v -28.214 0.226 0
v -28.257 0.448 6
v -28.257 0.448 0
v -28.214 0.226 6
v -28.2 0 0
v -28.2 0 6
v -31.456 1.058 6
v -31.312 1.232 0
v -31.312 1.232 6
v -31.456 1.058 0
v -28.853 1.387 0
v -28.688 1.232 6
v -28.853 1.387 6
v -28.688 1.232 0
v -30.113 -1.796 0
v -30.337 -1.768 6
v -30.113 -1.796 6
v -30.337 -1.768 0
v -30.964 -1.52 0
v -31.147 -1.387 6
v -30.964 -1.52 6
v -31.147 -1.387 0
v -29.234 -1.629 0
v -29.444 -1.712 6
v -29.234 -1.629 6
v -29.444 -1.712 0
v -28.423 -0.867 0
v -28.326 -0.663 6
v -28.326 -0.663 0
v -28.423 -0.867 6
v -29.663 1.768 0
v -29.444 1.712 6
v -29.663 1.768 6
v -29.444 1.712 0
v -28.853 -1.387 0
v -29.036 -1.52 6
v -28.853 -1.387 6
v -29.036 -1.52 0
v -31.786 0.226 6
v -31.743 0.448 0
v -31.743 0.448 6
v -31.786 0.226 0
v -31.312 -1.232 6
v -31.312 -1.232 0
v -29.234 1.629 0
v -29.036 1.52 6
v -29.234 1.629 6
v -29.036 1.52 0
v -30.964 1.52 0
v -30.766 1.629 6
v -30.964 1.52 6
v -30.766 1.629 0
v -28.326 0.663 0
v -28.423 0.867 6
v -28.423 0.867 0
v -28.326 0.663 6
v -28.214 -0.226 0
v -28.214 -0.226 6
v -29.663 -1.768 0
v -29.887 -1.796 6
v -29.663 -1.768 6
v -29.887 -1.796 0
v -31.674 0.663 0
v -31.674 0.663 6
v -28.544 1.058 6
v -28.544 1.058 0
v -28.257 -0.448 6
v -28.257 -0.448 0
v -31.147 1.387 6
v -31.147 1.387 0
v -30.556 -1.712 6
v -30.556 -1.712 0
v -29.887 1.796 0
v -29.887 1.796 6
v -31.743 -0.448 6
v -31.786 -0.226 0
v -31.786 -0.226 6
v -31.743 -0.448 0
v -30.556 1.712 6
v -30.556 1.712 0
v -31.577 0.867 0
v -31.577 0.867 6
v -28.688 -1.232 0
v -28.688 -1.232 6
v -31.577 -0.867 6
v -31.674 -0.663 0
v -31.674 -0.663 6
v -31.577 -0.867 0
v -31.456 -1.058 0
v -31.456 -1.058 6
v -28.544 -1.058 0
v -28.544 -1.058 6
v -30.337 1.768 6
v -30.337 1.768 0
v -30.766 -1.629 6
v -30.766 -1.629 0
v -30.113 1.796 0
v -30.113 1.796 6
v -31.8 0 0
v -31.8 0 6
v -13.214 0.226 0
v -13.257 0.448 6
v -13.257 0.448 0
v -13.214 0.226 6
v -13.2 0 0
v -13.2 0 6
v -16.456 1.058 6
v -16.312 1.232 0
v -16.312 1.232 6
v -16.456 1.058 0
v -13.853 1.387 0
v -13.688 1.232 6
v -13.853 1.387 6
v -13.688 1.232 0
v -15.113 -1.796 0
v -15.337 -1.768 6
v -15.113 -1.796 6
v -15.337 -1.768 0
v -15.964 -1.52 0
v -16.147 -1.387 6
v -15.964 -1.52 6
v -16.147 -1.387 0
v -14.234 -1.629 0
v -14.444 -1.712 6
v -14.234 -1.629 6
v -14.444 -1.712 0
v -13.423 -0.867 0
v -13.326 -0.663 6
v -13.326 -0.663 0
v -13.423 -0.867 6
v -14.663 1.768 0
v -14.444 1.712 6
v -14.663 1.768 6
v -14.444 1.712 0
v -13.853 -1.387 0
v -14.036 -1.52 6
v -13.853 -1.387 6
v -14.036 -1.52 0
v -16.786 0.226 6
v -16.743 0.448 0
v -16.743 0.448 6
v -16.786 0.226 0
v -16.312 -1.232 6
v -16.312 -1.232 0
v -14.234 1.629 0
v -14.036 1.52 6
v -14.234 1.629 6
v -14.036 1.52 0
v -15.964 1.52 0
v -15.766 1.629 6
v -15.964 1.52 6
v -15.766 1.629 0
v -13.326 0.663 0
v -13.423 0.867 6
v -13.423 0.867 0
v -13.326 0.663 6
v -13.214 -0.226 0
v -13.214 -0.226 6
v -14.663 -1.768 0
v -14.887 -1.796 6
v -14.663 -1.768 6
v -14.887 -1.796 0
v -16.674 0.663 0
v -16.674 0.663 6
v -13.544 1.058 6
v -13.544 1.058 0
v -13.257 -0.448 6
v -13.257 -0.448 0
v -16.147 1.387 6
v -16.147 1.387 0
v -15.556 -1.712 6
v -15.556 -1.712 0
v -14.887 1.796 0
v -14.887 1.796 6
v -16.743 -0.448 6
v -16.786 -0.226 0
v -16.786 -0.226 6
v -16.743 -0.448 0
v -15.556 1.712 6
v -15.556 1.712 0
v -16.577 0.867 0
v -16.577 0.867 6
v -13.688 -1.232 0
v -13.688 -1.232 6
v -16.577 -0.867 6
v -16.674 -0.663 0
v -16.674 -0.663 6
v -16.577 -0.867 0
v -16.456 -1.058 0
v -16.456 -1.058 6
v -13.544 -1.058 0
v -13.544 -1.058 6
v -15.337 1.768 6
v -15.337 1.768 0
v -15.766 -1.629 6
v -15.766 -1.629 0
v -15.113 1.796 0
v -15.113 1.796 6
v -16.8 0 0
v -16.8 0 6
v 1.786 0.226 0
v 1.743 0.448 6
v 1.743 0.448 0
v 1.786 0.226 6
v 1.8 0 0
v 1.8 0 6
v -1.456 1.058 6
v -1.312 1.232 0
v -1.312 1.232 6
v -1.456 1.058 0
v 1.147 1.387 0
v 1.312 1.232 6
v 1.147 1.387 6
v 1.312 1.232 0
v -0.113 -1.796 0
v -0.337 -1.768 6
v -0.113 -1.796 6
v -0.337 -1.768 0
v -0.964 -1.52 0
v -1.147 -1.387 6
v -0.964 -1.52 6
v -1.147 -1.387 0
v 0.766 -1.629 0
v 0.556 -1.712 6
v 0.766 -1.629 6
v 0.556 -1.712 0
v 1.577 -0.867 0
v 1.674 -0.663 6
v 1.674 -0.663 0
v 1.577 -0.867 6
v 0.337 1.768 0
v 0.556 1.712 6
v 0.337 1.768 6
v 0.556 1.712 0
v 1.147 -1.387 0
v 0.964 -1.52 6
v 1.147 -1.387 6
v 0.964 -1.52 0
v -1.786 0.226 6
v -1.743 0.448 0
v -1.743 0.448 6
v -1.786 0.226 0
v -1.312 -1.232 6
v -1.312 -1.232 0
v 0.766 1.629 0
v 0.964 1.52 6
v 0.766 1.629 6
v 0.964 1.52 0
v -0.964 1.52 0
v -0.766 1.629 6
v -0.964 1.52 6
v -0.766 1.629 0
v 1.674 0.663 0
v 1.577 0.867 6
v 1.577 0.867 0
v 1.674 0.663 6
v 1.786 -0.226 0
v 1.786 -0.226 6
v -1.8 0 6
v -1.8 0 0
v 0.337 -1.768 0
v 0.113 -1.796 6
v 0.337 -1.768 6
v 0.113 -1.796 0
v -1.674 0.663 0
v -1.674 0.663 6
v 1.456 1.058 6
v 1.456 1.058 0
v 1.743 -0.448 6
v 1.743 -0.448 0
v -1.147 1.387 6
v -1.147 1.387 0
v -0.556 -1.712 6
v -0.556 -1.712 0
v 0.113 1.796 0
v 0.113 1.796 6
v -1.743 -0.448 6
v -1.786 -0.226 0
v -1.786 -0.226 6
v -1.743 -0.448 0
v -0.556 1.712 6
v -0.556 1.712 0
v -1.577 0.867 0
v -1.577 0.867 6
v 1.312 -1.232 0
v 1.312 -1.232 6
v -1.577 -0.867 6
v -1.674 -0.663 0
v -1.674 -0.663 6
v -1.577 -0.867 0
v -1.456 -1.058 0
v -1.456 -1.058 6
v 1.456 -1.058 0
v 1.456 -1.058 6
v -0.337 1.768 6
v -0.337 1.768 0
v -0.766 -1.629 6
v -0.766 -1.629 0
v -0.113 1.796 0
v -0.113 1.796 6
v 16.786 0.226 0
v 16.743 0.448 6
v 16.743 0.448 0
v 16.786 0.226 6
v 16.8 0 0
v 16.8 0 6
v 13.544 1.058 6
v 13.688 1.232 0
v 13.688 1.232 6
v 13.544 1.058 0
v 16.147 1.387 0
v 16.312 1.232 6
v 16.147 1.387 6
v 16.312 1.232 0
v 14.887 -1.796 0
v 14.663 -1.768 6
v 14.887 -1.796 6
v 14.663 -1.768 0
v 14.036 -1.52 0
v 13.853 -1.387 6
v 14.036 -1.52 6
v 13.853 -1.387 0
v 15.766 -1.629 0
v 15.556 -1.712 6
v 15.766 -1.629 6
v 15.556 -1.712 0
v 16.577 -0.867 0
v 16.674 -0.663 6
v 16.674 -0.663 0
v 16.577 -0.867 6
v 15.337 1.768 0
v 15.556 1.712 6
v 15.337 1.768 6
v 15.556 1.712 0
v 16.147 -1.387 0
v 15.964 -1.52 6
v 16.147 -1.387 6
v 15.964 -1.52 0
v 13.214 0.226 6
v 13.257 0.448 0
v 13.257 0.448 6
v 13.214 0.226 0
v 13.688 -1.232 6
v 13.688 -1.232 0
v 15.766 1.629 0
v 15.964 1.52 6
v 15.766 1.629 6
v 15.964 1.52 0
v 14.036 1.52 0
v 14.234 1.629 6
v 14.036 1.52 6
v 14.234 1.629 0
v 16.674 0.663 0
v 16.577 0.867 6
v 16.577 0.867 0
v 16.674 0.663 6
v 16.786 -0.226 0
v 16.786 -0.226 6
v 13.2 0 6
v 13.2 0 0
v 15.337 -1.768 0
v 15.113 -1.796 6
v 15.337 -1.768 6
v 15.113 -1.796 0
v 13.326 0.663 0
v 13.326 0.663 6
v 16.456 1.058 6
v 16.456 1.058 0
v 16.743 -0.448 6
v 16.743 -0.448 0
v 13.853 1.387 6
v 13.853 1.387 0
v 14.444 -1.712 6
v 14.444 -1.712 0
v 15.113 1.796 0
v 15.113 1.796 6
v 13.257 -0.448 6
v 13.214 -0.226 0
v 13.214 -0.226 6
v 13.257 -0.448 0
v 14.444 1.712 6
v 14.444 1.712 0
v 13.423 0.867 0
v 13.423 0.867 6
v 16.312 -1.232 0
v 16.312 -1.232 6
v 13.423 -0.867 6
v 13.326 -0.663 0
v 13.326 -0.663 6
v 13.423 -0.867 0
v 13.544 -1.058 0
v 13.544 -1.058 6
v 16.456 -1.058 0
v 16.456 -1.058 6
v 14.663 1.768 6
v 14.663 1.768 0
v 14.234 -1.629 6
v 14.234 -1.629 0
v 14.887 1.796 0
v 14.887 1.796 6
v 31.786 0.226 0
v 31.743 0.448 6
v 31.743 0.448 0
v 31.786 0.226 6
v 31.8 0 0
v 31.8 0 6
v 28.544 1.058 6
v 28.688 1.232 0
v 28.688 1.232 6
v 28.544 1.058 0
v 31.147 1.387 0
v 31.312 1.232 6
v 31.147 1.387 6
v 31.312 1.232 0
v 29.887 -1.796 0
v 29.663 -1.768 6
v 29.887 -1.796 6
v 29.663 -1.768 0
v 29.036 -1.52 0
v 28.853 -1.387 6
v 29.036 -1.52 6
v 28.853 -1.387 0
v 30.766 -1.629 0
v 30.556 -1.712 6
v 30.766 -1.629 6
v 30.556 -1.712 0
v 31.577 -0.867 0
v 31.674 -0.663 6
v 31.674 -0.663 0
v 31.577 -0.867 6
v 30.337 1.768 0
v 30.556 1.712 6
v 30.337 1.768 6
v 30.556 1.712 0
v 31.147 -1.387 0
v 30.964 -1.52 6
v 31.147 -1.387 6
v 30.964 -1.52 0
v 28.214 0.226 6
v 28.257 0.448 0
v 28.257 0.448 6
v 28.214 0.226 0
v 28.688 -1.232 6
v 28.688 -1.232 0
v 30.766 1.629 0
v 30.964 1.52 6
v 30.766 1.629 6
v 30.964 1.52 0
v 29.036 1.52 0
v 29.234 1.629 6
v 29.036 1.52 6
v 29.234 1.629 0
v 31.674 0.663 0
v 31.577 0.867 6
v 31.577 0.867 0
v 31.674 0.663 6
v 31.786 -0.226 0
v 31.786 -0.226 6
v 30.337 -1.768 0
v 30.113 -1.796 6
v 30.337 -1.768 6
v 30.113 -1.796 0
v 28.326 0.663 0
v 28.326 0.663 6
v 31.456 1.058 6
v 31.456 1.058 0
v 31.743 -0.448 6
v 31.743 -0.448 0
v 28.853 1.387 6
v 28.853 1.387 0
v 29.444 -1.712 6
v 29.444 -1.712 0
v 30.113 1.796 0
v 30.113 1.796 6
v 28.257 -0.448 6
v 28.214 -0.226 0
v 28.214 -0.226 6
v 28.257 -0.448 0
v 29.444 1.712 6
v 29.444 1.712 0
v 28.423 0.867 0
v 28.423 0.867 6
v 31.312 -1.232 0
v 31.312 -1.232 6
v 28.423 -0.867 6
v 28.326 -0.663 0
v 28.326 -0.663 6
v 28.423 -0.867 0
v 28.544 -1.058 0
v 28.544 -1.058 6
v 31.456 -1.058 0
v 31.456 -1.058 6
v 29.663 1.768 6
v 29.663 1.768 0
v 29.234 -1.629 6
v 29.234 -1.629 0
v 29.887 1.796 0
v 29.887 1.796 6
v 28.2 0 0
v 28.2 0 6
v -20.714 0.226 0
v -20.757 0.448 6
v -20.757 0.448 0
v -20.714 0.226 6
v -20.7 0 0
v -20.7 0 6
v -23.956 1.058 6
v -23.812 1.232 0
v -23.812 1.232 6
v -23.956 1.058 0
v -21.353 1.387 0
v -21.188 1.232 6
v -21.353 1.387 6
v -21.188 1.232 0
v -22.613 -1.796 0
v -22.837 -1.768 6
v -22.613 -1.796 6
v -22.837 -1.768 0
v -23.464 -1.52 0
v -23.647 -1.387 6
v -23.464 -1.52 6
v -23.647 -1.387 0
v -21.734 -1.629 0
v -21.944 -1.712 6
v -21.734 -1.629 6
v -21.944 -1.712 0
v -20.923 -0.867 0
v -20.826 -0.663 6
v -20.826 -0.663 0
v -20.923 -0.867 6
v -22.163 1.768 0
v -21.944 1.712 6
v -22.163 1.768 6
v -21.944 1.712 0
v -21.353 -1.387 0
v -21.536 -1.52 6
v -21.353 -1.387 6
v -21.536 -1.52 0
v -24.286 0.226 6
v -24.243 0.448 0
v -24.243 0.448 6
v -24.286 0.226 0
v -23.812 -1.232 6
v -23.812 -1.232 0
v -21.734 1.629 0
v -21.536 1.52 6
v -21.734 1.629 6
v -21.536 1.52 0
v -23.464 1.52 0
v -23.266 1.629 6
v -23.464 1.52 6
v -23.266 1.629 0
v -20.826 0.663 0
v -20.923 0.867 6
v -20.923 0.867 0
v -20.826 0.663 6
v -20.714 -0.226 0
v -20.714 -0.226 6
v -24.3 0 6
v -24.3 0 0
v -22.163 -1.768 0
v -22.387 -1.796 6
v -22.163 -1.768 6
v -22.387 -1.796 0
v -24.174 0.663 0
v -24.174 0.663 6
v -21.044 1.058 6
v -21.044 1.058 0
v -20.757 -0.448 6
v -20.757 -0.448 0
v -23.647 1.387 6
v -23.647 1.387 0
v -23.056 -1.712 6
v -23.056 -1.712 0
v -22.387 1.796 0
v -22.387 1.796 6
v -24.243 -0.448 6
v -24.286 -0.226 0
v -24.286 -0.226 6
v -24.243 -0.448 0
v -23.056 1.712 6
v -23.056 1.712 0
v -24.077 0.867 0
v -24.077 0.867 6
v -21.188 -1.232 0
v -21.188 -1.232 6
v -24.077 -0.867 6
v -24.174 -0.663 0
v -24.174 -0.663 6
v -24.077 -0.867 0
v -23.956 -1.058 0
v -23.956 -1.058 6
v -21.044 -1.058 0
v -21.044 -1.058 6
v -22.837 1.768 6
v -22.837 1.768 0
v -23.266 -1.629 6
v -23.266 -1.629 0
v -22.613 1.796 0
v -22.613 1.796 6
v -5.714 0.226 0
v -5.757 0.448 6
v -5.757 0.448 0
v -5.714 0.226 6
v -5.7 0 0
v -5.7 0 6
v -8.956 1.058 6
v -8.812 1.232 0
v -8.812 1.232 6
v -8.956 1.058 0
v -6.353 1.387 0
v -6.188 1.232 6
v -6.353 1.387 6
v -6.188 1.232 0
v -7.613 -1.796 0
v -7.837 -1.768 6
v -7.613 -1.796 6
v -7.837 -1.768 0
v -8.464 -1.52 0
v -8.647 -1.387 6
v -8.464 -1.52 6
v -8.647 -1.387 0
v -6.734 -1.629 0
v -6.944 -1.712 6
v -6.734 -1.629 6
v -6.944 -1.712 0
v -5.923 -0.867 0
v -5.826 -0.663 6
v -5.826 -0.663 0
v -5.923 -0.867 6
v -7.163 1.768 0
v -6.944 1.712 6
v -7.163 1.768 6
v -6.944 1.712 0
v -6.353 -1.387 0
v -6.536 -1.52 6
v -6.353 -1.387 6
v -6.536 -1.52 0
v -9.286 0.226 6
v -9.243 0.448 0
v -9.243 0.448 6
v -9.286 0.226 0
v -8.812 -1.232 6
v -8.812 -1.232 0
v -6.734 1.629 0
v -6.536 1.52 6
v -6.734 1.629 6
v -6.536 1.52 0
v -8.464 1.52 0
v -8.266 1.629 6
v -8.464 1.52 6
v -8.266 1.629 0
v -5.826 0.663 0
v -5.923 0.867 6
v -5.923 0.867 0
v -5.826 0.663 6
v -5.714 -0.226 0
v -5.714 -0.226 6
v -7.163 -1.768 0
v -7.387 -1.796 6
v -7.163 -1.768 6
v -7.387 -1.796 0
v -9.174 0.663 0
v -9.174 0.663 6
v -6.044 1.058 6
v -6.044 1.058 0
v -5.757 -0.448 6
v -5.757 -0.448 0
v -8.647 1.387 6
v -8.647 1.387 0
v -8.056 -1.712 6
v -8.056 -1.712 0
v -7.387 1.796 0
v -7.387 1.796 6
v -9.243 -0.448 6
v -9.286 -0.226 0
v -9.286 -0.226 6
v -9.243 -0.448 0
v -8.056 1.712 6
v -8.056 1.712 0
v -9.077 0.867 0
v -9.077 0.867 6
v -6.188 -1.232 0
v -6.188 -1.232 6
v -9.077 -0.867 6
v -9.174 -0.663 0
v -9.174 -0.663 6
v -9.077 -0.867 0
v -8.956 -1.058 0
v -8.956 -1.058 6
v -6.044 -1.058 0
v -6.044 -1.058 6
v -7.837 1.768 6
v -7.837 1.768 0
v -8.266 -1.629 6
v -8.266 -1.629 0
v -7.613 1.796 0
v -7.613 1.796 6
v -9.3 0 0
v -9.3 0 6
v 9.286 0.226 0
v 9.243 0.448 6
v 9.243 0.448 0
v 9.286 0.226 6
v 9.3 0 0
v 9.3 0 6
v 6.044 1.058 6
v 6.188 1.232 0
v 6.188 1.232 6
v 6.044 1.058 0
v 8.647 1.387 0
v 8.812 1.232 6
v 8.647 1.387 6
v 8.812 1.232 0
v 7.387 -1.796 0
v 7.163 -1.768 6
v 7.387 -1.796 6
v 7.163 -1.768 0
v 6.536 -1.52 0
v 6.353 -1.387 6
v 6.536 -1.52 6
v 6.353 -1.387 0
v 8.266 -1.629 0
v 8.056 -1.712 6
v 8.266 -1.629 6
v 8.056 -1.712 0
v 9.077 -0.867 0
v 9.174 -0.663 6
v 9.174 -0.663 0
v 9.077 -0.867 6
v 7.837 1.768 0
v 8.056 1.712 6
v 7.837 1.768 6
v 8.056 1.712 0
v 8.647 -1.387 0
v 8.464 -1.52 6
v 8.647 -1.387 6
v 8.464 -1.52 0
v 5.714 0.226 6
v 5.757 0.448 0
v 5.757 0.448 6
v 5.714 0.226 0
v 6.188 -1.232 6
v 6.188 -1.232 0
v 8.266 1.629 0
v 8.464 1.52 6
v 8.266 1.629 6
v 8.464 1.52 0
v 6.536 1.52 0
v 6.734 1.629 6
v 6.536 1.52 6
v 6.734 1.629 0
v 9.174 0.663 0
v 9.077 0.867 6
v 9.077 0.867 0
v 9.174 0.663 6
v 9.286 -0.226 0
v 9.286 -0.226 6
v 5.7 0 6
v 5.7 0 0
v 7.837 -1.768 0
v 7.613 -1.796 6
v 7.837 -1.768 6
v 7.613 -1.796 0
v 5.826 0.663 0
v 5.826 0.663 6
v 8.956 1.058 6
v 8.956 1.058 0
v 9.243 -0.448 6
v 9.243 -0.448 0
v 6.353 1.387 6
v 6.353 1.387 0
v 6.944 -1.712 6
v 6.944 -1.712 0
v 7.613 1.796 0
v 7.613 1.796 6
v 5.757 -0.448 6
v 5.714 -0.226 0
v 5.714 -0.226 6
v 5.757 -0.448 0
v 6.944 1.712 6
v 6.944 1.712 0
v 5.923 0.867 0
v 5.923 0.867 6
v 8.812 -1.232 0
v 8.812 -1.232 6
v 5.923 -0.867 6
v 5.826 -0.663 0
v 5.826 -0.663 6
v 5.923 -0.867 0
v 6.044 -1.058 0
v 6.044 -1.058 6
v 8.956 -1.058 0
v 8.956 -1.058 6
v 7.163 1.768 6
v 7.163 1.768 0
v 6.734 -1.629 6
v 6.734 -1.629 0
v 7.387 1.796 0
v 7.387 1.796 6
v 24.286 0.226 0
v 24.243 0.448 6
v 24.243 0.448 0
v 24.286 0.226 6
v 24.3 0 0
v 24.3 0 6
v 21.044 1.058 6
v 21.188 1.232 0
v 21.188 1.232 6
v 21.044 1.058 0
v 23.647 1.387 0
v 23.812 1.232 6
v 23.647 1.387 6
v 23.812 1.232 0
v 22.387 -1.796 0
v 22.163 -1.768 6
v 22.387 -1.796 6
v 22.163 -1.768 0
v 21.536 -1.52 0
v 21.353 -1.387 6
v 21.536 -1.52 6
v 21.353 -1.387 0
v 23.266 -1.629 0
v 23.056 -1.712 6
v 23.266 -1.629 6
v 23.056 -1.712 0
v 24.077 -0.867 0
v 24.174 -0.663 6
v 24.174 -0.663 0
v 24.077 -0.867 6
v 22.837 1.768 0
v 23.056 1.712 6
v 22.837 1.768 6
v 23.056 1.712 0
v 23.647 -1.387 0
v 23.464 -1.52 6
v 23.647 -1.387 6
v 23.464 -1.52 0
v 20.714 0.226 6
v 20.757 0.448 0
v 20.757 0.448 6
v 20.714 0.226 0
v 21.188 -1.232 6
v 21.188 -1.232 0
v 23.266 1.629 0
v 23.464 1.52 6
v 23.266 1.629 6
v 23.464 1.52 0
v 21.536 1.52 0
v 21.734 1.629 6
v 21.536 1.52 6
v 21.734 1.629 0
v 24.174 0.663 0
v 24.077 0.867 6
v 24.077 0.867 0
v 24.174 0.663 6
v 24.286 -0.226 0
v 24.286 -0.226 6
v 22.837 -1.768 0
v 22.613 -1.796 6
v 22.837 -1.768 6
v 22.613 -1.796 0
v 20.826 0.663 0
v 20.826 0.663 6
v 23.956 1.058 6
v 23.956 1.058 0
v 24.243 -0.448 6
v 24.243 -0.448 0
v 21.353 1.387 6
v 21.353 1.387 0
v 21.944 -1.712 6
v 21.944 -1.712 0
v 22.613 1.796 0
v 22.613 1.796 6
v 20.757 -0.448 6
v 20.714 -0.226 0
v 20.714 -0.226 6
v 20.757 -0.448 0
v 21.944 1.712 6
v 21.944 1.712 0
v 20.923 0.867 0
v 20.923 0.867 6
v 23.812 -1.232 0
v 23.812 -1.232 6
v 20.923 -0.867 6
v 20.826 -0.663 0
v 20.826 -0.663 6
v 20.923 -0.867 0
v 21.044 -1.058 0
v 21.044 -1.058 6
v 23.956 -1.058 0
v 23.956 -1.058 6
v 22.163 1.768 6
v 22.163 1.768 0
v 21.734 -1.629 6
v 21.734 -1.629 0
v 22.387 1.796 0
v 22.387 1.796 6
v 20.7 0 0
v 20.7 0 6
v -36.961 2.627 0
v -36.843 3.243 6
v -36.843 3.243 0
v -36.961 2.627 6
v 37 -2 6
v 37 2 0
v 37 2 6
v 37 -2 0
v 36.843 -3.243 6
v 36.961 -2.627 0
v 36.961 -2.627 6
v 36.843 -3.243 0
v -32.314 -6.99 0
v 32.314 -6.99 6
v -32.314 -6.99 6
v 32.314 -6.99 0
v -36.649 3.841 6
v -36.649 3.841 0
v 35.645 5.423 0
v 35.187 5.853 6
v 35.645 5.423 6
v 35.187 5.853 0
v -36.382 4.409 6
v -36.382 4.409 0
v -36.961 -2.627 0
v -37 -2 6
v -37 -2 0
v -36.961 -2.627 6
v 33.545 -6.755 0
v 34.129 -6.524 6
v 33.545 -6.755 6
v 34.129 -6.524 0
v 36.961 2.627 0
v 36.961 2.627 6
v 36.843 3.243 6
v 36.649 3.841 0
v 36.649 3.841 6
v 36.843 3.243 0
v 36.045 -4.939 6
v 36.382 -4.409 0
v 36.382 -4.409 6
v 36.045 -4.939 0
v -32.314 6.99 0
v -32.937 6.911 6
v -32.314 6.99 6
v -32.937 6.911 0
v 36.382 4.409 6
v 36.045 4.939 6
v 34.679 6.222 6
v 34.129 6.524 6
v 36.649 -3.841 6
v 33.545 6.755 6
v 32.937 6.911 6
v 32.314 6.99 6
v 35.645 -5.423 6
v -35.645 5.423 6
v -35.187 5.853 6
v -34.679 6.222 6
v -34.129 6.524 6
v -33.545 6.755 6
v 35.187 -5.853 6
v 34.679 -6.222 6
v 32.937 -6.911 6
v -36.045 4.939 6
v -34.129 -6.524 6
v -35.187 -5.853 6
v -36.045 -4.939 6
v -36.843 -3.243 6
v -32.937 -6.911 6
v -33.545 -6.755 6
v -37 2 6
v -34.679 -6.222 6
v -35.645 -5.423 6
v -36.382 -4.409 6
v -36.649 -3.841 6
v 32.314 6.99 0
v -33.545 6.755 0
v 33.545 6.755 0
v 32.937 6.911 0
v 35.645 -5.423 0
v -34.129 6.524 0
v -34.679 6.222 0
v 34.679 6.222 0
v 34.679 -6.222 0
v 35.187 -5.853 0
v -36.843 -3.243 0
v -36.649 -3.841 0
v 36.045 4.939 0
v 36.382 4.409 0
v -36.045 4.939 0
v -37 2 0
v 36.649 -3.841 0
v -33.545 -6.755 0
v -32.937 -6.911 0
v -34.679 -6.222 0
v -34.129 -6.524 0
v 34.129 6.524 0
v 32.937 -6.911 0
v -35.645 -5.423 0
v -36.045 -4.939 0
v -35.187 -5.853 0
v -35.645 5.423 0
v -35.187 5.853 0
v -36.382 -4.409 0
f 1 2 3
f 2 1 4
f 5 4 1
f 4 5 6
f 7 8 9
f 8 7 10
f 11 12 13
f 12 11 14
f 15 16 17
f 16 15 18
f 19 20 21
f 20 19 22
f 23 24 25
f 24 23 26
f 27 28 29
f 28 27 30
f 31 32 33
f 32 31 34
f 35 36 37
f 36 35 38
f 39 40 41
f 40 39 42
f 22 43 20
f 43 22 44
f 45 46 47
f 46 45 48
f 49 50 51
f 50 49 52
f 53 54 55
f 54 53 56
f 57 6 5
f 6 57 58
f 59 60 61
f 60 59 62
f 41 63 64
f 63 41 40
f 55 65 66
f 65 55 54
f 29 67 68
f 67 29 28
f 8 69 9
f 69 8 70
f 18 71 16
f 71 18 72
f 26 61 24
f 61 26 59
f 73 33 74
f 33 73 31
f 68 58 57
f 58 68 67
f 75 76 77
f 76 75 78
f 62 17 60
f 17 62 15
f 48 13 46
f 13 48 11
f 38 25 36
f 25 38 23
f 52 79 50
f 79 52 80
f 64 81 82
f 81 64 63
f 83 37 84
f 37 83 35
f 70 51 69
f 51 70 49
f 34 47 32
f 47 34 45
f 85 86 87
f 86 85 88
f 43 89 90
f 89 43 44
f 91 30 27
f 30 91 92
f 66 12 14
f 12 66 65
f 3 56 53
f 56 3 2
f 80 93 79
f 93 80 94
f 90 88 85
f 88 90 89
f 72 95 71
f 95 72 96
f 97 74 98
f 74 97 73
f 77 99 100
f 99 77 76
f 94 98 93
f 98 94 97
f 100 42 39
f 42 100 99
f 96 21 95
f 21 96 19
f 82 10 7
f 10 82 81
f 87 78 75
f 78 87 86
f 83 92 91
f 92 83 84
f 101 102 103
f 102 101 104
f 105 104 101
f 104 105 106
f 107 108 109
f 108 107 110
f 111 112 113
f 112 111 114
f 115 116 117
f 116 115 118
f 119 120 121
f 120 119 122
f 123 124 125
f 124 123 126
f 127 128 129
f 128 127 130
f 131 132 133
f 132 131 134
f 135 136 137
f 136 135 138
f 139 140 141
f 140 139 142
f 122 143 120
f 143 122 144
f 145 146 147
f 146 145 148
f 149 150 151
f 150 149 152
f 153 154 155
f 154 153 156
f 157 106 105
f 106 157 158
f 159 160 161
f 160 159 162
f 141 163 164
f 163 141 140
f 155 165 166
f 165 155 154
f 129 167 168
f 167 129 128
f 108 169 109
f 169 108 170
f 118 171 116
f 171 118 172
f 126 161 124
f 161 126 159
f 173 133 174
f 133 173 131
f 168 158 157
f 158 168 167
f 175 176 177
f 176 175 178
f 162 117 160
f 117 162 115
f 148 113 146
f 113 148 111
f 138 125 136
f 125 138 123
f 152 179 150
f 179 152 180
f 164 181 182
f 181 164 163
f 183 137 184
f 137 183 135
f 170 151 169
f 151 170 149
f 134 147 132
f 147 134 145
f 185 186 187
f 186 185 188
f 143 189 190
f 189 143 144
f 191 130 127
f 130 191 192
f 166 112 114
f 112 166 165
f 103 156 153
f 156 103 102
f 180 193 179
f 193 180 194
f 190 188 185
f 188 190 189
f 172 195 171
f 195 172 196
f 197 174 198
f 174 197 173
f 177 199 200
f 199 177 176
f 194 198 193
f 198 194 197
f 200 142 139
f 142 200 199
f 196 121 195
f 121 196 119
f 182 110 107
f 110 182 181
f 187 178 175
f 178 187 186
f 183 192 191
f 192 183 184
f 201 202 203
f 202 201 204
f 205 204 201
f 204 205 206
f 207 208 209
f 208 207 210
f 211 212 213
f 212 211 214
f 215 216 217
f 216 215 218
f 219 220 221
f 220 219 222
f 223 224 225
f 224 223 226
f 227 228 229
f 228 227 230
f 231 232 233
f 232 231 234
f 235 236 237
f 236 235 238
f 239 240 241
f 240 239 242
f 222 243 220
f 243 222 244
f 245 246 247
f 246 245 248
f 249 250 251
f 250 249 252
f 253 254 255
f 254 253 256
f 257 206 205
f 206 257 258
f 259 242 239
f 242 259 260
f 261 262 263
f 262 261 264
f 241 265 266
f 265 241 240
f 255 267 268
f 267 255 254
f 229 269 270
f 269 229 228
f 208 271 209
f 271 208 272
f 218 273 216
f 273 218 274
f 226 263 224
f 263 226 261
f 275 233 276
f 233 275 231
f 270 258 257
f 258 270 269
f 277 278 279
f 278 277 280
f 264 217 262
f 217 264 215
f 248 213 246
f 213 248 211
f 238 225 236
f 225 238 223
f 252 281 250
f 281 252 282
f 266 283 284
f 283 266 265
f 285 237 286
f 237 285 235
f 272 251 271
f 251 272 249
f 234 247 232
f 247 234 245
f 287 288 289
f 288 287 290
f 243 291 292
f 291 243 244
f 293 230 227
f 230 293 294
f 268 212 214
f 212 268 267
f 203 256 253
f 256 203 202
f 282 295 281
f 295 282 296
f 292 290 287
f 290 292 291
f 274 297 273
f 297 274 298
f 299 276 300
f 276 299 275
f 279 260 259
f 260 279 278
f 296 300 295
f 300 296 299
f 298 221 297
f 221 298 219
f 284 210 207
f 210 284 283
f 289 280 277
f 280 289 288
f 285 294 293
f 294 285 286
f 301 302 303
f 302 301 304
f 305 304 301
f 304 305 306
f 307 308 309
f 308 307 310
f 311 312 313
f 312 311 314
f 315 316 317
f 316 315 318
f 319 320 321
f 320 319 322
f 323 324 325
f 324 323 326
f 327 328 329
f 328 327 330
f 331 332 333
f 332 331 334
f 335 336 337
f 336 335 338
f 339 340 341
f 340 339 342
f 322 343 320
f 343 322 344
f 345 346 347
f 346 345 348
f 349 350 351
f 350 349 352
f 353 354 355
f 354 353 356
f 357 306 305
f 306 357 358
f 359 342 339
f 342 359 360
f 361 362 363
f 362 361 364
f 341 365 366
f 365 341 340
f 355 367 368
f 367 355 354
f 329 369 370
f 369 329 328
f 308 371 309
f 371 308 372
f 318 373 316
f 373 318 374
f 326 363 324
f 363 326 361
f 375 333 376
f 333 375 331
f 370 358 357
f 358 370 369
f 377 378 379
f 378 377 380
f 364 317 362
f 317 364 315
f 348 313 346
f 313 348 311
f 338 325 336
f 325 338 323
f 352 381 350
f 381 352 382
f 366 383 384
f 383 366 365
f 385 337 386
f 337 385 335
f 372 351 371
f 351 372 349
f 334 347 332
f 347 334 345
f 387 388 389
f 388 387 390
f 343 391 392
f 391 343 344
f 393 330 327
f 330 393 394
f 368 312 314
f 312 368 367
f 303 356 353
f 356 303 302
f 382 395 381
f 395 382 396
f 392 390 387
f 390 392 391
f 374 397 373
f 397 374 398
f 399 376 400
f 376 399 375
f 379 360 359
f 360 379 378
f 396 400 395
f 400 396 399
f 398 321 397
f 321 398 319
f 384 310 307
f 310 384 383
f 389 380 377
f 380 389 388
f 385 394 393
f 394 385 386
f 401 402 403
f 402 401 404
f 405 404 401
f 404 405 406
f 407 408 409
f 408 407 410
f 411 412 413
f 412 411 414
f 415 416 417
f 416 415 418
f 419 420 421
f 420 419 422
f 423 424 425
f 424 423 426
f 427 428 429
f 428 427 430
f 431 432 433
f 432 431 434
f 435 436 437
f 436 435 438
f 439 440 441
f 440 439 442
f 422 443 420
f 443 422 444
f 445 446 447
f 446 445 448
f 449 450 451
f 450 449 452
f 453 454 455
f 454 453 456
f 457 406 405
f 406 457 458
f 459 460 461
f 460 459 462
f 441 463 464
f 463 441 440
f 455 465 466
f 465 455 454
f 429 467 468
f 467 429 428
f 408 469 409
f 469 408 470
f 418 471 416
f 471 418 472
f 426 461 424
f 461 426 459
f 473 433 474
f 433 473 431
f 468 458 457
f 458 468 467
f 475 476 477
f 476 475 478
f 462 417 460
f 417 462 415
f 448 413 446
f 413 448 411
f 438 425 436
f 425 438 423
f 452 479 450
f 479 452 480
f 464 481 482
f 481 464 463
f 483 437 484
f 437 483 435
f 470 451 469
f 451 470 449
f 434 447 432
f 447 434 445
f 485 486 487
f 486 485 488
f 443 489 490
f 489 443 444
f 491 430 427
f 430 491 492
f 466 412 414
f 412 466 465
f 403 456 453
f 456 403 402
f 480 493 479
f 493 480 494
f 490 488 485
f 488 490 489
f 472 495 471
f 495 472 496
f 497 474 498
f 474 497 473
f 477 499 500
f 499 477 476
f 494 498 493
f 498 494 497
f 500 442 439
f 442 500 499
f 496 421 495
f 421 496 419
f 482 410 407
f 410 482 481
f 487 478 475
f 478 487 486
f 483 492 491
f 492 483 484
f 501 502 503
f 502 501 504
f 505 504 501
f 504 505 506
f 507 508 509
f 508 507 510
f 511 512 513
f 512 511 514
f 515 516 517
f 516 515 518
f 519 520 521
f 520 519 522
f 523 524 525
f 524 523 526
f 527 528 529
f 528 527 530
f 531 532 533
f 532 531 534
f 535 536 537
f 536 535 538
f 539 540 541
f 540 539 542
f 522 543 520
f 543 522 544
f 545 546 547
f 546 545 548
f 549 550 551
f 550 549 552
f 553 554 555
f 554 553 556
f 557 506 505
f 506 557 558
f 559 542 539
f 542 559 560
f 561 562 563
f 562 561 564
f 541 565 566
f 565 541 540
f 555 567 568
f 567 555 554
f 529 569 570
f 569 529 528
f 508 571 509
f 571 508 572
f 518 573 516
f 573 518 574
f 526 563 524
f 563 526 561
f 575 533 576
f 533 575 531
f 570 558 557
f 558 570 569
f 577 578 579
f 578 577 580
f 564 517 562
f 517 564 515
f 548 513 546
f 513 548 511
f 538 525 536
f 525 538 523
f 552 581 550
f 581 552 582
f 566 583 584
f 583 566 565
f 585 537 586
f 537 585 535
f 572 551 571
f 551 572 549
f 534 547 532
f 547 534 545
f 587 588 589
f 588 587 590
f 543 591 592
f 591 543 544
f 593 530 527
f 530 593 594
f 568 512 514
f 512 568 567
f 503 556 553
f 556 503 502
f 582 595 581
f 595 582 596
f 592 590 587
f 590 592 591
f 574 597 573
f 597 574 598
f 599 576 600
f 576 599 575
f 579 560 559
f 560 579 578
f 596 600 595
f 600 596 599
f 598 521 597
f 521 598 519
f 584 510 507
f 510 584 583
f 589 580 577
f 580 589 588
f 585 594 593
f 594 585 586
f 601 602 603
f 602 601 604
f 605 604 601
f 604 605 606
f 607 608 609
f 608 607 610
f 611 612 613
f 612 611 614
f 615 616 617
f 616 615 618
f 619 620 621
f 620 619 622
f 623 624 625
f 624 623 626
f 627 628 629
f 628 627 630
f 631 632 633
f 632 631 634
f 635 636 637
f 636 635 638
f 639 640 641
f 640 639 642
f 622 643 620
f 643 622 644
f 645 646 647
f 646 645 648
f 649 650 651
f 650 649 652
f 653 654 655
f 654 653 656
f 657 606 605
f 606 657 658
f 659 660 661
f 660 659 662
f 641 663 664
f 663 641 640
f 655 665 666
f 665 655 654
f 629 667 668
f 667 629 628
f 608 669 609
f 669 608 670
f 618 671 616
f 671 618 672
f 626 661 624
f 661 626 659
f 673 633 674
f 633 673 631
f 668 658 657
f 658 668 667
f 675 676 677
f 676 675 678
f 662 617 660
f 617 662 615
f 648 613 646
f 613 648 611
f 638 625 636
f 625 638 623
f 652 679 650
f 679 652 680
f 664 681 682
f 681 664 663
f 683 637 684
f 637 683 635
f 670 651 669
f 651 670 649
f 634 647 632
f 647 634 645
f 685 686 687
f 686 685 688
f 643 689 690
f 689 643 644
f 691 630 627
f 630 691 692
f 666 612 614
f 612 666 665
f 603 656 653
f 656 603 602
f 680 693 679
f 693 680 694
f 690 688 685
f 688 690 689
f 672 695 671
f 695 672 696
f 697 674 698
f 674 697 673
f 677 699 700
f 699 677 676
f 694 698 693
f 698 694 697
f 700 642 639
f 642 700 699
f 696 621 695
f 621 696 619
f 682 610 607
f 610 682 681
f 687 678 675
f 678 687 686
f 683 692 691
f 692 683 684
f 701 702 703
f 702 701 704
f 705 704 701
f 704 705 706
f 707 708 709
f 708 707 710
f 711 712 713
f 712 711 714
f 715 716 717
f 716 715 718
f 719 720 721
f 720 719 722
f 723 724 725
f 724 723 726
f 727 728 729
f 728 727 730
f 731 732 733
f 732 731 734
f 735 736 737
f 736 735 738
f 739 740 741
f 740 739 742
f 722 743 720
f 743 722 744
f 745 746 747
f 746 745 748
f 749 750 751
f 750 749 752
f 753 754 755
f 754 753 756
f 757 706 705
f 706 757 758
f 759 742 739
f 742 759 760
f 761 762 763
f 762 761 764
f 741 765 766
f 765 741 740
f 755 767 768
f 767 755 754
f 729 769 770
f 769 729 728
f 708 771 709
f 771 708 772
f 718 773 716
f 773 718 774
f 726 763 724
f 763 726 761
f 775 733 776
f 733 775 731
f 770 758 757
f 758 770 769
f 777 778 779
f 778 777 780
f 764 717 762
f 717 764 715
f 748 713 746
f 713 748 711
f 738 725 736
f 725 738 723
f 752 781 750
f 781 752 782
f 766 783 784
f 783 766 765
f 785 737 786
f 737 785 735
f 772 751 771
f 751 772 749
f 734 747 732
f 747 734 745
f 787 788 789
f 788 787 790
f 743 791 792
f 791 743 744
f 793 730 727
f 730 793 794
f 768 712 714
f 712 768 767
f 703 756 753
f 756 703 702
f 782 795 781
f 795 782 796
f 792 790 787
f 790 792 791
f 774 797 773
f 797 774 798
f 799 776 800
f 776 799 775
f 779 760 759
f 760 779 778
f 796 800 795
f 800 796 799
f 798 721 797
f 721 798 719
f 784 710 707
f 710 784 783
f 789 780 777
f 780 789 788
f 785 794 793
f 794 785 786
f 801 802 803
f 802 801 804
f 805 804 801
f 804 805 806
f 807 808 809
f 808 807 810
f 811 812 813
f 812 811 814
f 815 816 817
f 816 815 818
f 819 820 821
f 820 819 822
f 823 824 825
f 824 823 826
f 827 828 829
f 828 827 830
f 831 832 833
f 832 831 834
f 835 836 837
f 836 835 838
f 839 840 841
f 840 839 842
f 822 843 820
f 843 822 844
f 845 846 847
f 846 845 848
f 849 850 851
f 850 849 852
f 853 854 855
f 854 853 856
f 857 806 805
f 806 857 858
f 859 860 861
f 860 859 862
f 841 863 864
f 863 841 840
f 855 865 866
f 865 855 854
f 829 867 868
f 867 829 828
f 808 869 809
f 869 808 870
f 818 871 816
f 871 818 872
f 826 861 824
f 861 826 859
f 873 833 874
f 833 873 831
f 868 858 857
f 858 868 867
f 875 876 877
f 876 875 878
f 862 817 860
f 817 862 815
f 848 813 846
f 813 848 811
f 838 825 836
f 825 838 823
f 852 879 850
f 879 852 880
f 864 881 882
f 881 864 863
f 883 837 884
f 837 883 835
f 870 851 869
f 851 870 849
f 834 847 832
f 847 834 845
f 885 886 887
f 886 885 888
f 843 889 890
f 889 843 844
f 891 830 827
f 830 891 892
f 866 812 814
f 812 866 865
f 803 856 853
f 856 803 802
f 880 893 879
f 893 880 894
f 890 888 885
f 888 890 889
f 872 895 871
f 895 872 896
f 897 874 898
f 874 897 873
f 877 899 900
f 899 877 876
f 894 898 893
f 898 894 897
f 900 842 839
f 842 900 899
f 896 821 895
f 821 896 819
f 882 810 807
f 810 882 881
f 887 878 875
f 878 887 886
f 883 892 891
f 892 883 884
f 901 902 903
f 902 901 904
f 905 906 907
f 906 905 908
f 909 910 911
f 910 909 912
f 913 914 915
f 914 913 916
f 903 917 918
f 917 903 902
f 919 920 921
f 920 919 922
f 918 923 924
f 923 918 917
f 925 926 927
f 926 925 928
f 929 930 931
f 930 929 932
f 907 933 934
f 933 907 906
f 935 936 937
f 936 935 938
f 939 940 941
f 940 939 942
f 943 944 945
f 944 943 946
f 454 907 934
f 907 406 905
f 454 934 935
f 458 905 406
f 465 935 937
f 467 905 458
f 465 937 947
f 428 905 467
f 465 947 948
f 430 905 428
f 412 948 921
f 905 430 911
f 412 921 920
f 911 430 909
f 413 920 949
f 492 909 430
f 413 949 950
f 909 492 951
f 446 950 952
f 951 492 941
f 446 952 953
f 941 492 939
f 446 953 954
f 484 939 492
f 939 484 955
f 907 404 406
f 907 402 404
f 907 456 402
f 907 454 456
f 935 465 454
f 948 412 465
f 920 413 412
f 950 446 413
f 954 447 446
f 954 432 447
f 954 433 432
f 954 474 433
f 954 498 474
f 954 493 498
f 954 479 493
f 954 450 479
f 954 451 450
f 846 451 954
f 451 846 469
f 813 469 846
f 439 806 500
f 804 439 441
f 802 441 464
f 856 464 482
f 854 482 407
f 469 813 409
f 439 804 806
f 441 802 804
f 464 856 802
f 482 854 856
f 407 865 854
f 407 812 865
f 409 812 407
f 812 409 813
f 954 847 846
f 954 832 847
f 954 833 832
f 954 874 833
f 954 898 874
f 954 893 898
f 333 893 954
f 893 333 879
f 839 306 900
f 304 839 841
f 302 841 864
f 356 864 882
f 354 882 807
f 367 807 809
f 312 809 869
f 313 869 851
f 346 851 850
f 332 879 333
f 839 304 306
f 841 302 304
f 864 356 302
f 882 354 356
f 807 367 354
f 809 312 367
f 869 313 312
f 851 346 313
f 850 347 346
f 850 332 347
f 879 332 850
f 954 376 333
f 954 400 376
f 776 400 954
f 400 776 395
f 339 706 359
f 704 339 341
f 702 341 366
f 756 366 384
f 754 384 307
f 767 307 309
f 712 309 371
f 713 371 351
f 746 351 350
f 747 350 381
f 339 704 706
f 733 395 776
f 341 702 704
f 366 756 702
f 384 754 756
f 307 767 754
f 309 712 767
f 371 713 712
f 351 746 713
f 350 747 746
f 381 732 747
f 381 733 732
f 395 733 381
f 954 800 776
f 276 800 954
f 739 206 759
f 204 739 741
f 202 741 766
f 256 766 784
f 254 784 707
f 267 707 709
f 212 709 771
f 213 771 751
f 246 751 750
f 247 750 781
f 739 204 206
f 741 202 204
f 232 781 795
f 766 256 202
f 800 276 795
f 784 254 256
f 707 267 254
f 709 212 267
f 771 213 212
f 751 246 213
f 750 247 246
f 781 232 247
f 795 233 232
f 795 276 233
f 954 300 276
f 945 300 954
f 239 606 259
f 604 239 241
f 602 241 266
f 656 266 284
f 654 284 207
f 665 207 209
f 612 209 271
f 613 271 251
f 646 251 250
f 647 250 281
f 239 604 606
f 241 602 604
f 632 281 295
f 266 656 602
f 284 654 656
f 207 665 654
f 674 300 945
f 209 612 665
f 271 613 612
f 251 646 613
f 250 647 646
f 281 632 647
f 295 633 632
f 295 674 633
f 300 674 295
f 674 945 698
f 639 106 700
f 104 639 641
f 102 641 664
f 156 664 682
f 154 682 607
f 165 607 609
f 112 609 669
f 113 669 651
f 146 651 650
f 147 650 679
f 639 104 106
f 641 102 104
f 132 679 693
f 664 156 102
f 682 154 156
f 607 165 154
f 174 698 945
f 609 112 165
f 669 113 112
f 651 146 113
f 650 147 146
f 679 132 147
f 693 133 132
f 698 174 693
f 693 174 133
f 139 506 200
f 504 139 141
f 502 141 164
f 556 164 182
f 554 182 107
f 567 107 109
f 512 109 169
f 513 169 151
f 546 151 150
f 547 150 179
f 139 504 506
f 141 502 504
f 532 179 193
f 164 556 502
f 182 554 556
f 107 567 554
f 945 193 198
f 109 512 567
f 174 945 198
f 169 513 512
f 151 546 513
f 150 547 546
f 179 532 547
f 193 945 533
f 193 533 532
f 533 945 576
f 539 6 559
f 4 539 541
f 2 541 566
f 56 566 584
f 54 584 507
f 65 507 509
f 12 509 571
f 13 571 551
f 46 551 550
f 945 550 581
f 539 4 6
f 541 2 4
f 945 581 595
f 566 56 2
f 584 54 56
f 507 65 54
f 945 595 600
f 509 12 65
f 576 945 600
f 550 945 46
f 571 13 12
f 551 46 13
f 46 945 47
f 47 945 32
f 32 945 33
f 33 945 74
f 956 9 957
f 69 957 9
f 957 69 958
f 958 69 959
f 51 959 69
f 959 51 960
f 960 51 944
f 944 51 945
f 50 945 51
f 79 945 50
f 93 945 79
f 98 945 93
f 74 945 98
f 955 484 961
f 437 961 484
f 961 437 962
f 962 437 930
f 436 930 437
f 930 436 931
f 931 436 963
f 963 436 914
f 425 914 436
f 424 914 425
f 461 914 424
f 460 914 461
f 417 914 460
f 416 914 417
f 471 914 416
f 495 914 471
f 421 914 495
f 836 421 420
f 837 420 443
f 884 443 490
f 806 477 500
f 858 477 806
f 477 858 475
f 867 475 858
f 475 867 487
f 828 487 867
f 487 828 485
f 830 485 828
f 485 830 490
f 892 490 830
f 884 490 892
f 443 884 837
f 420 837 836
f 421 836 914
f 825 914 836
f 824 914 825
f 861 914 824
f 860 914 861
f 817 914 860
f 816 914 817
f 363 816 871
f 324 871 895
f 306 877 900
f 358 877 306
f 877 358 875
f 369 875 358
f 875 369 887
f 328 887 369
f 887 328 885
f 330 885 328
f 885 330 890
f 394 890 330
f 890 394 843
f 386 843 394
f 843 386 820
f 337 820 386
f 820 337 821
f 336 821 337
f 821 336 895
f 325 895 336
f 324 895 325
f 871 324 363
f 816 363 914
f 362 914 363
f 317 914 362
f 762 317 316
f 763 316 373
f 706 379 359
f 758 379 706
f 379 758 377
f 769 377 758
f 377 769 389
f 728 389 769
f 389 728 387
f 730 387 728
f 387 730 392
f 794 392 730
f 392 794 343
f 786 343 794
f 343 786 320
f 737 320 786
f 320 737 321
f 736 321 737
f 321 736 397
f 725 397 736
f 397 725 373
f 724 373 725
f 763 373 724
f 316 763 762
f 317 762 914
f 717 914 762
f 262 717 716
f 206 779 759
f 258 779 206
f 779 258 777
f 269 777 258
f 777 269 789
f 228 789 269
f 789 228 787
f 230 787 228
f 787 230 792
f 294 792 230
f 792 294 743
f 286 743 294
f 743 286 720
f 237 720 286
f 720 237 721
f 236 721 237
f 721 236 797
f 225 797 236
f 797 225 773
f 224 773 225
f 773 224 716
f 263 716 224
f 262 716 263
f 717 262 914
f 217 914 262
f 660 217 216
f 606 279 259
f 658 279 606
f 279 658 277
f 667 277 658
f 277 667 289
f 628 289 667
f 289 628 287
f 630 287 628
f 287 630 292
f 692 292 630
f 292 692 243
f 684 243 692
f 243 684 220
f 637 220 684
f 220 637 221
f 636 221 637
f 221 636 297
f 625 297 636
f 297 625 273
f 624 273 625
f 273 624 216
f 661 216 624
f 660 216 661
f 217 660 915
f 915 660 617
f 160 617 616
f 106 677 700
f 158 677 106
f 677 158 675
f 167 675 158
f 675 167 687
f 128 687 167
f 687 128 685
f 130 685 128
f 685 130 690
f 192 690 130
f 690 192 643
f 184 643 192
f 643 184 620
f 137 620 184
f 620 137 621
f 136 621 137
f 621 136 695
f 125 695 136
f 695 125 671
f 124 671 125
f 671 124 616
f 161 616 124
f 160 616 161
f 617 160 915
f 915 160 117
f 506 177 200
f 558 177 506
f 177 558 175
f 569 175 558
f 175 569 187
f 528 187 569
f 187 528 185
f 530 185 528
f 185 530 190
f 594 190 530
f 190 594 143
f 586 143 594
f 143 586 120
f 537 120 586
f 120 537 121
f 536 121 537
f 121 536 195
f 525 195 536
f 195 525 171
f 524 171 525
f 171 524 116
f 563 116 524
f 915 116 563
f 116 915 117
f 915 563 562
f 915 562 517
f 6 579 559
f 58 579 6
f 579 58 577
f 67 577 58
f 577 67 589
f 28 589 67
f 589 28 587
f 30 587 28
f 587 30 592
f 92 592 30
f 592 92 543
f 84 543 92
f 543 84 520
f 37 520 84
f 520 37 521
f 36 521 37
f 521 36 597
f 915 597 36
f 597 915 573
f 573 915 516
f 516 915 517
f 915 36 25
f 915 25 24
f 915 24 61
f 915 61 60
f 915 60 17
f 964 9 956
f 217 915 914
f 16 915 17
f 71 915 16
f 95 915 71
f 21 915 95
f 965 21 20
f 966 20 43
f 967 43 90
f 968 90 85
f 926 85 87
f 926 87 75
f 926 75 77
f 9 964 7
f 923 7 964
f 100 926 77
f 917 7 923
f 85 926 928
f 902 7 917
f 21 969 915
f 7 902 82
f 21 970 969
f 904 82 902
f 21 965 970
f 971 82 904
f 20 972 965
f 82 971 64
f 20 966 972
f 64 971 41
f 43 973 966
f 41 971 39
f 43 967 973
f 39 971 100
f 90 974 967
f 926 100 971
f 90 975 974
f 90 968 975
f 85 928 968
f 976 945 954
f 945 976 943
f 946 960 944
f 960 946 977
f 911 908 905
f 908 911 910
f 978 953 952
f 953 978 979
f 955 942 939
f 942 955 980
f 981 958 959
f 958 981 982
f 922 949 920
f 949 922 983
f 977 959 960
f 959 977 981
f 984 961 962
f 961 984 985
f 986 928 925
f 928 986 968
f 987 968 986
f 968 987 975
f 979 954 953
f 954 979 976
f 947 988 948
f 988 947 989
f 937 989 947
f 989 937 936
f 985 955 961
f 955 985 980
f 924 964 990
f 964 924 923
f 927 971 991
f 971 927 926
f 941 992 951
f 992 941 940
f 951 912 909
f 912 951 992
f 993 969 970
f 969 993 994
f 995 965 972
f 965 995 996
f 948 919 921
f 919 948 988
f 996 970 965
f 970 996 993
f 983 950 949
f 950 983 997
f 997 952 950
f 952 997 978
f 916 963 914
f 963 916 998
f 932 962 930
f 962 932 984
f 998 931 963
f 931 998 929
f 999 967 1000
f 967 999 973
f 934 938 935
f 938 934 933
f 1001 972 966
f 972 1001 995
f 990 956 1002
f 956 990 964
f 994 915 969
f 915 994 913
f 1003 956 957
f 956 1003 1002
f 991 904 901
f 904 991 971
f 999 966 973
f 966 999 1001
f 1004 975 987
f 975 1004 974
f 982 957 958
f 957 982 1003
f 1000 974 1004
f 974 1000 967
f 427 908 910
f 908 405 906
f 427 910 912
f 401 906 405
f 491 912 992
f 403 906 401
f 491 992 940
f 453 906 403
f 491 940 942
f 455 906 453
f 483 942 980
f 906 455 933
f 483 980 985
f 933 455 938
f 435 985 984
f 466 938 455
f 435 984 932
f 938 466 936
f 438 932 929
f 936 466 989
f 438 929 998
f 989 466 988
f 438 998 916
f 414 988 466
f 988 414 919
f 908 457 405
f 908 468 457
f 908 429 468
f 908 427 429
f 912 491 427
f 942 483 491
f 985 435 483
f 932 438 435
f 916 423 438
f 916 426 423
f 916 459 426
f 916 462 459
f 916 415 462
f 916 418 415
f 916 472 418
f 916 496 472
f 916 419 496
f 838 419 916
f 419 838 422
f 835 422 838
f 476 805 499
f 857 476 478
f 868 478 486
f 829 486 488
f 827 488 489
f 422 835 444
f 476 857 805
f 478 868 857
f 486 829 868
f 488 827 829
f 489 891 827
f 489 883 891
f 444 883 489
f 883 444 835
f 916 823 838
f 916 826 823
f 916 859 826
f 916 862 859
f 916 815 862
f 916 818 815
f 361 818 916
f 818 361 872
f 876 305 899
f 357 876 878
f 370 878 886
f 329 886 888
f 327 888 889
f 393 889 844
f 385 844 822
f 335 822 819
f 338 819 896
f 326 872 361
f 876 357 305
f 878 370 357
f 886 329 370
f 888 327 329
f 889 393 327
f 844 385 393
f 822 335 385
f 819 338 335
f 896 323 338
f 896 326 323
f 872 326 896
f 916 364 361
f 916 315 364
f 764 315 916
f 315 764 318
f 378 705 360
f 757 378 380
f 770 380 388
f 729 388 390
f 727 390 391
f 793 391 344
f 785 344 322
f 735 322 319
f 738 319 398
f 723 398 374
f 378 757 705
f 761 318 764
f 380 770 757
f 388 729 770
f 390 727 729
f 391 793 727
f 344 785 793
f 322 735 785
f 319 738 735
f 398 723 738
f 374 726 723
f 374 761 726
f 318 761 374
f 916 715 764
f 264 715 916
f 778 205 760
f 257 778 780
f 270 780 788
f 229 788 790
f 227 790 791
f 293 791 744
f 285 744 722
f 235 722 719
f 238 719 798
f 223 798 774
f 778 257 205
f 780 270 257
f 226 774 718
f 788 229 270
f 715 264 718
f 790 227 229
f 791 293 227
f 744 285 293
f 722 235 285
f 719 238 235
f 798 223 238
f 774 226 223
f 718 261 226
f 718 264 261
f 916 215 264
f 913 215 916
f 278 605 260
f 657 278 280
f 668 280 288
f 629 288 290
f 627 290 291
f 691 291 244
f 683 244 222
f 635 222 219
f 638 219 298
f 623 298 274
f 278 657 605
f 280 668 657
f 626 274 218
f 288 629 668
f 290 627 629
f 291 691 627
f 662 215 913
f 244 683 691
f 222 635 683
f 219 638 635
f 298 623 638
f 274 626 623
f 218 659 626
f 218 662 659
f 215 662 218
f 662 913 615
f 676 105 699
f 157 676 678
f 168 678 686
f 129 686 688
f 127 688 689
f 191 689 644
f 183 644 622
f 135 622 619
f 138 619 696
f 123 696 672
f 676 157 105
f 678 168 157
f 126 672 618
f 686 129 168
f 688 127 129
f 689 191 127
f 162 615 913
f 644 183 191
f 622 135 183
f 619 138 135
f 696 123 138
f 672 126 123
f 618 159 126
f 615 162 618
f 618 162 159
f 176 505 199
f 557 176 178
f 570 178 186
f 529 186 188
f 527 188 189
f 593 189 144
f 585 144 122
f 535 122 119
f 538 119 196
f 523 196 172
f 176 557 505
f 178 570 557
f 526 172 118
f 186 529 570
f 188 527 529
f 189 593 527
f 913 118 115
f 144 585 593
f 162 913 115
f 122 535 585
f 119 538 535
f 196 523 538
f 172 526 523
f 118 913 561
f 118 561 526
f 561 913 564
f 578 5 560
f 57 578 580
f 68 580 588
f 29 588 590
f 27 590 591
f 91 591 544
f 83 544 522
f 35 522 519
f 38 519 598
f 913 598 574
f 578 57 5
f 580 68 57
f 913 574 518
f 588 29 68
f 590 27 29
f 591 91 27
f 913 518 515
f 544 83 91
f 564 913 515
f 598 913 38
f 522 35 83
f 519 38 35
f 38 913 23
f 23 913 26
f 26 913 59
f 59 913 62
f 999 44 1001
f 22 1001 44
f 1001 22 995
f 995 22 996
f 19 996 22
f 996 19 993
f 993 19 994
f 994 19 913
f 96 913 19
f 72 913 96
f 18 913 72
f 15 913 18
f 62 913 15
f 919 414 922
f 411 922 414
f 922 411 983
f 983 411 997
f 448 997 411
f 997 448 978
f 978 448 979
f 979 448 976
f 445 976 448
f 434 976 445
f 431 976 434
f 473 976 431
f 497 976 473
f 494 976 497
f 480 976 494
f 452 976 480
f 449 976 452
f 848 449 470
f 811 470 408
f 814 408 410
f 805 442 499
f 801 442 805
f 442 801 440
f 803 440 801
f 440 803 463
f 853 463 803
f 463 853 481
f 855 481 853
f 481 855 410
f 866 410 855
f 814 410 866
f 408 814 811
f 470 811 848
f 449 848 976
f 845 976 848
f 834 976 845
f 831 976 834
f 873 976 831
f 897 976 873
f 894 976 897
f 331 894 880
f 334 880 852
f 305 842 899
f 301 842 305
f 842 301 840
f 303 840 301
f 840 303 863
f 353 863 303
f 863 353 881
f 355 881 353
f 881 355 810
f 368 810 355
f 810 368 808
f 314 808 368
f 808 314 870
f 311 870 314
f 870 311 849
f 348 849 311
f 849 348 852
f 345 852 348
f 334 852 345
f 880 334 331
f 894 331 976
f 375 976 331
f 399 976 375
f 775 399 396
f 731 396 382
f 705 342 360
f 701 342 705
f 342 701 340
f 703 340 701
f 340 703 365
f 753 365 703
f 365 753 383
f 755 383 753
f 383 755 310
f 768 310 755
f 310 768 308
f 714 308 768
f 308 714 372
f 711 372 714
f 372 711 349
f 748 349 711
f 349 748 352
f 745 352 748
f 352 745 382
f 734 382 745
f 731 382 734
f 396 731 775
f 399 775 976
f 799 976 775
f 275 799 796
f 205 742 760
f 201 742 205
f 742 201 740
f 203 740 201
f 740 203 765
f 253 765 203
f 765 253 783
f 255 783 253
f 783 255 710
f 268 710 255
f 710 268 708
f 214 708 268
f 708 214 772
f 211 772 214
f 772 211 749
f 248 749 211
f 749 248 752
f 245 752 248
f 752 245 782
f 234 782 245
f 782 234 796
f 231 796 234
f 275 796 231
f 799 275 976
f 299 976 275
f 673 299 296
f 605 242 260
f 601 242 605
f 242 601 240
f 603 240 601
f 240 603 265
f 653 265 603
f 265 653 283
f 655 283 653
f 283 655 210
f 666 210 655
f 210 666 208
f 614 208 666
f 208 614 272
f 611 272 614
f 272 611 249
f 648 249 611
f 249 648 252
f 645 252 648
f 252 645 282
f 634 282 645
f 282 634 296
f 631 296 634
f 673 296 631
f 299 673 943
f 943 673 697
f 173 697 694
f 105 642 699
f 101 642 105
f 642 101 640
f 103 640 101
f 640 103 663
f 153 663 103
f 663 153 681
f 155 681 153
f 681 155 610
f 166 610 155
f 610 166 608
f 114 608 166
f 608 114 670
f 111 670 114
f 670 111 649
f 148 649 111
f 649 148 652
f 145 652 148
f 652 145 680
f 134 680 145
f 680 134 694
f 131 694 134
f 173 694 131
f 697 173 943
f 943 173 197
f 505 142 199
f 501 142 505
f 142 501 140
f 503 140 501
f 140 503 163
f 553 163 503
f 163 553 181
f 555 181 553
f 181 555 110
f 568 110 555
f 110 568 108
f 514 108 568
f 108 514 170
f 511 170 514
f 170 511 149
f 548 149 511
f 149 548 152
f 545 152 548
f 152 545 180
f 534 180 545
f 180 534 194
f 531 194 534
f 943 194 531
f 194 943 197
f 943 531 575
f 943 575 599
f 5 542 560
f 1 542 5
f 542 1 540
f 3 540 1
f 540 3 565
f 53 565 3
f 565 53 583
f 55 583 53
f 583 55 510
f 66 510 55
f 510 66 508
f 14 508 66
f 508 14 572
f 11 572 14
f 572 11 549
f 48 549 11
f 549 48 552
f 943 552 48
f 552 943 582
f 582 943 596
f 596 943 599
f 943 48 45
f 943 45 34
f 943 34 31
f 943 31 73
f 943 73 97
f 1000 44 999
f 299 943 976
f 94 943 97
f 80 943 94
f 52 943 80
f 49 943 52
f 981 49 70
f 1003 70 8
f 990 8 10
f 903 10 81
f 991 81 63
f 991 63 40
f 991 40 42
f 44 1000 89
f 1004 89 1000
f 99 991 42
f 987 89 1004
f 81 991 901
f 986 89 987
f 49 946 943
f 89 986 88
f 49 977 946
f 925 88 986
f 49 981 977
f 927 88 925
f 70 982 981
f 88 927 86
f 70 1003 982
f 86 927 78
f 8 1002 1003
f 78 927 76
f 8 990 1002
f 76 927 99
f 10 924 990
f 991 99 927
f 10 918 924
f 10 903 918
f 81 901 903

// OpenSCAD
$fn = 50;


difference() {
	union() {
		hull() {
			translate(v = [-32.0000000000, 2.0000000000, 0]) {
				cylinder(h = 6, r = 5);
			}
			translate(v = [32.0000000000, 2.0000000000, 0]) {
				cylinder(h = 6, r = 5);
			}
			translate(v = [-32.0000000000, -2.0000000000, 0]) {
				cylinder(h = 6, r = 5);
			}
			translate(v = [32.0000000000, -2.0000000000, 0]) {
				cylinder(h = 6, r = 5);
			}
		}
	}
	union() {
		translate(v = [-30.0000000000, 0.0000000000, 0]) {
			translate(v = [0, 0, -100]) {
				cylinder(h = 200, r = 1.8000000000);
			}
		}
		translate(v = [-15.0000000000, 0.0000000000, 0]) {
			translate(v = [0, 0, -100]) {
				cylinder(h = 200, r = 1.8000000000);
			}
		}
		translate(v = [0, 0, -100]) {
			cylinder(h = 200, r = 1.8000000000);
		}
		translate(v = [15.0000000000, 0.0000000000, 0]) {
			translate(v = [0, 0, -100]) {
				cylinder(h = 200, r = 1.8000000000);
			}
		}
		translate(v = [30.0000000000, 0.0000000000, 0]) {
			translate(v = [0, 0, -100]) {
				cylinder(h = 200, r = 1.8000000000);
			}
		}
		translate(v = [-30.0000000000, 0.0000000000, 0]) {
			translate(v = [0, 0, -100]) {
				cylinder(h = 200, r = 1.8000000000);
			}
		}
		translate(v = [-22.5000000000, 0.0000000000, 0]) {
			translate(v = [0, 0, -100]) {
				cylinder(h = 200, r = 1.8000000000);
			}
		}
		translate(v = [-15.0000000000, 0.0000000000, 0]) {
			translate(v = [0, 0, -100]) {
				cylinder(h = 200, r = 1.8000000000);
			}
		}
		translate(v = [-7.5000000000, 0.0000000000, 0]) {
			translate(v = [0, 0, -100]) {
				cylinder(h = 200, r = 1.8000000000);
			}
		}
		translate(v = [0, 0, -100]) {
			cylinder(h = 200, r = 1.8000000000);
		}
		translate(v = [7.5000000000, 0.0000000000, 0]) {
			translate(v = [0, 0, -100]) {
				cylinder(h = 200, r = 1.8000000000);
			}
		}
		translate(v = [15.0000000000, 0.0000000000, 0]) {
			translate(v = [0, 0, -100]) {
				cylinder(h = 200, r = 1.8000000000);
			}
		}
		translate(v = [22.5000000000, 0.0000000000, 0]) {
			translate(v = [0, 0, -100]) {
				cylinder(h = 200, r = 1.8000000000);
			}
		}
		translate(v = [30.0000000000, 0.0000000000, 0]) {
			translate(v = [0, 0, -100]) {
				cylinder(h = 200, r = 1.8000000000);
			}
		}
	}
}
